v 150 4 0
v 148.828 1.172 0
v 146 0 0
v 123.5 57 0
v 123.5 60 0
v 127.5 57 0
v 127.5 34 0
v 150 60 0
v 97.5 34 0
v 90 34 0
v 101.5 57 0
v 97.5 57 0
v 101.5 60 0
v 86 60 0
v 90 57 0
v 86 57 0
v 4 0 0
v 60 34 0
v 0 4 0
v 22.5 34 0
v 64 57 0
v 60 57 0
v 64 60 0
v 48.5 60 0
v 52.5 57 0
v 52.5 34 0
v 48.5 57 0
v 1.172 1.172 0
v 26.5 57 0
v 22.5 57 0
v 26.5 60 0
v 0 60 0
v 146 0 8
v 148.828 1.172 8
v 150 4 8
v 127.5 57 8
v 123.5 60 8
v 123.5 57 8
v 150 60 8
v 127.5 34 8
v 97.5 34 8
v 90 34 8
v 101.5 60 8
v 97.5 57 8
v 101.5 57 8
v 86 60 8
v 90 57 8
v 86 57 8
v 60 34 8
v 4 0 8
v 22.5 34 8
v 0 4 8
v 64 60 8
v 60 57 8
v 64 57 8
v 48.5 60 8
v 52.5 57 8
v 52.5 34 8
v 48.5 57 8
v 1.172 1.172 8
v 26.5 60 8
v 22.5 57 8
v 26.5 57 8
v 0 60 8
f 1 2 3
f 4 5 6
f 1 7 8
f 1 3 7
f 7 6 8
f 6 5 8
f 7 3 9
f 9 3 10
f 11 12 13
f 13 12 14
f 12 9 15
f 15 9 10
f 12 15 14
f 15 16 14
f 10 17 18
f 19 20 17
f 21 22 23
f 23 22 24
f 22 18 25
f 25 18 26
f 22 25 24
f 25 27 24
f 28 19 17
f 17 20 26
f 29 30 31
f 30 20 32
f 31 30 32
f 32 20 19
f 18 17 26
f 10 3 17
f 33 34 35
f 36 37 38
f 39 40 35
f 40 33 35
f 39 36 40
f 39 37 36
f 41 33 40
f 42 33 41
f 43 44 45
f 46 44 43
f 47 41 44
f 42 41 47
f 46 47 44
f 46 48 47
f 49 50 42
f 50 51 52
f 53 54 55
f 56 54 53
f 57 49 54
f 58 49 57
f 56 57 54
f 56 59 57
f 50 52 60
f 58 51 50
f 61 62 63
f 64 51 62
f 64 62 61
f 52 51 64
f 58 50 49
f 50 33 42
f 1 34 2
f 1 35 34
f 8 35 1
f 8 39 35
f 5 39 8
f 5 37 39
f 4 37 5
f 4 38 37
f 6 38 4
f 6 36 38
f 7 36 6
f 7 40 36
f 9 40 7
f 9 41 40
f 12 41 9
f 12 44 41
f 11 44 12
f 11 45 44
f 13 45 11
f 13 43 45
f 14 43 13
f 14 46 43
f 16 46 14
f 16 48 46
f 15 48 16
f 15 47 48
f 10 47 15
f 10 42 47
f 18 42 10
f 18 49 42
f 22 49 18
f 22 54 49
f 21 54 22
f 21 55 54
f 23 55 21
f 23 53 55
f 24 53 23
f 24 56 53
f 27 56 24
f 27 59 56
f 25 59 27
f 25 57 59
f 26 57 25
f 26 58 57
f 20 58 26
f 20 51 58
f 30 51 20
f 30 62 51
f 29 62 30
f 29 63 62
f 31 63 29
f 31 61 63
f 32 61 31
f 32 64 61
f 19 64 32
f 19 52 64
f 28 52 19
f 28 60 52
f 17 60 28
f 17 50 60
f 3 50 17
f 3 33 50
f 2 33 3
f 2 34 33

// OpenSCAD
$fn = 32;

// ----------------------------------------------------------------------
// Oversize slot bar: 150 mm bar with 3 oversize windows
// ----------------------------------------------------------------------

// --- parameters (mm) ---
profile_height = 8;       // extrusion height
profile_points = 32;      // points of the closed outline

profile = [[0, 4], [1.172, 1.172], [4, 0], [146, 0], [148.828, 1.172], [150, 4], [150, 60], [123.5, 60], [123.5, 57], [127.5, 57], [127.5, 34], [97.5, 34], [97.5, 57], [101.5, 57], [101.5, 60], [86, 60], [86, 57], [90, 57], [90, 34], [60, 34], [60, 57], [64, 57], [64, 60], [48.5, 60], [48.5, 57], [52.5, 57], [52.5, 34], [22.5, 34], [22.5, 57], [26.5, 57], [26.5, 60], [0, 60]];  // single closed polygon, 32 points, counter clockwise

// --- the one profile operation ---
linear_extrude(height = profile_height) polygon(points = profile);
